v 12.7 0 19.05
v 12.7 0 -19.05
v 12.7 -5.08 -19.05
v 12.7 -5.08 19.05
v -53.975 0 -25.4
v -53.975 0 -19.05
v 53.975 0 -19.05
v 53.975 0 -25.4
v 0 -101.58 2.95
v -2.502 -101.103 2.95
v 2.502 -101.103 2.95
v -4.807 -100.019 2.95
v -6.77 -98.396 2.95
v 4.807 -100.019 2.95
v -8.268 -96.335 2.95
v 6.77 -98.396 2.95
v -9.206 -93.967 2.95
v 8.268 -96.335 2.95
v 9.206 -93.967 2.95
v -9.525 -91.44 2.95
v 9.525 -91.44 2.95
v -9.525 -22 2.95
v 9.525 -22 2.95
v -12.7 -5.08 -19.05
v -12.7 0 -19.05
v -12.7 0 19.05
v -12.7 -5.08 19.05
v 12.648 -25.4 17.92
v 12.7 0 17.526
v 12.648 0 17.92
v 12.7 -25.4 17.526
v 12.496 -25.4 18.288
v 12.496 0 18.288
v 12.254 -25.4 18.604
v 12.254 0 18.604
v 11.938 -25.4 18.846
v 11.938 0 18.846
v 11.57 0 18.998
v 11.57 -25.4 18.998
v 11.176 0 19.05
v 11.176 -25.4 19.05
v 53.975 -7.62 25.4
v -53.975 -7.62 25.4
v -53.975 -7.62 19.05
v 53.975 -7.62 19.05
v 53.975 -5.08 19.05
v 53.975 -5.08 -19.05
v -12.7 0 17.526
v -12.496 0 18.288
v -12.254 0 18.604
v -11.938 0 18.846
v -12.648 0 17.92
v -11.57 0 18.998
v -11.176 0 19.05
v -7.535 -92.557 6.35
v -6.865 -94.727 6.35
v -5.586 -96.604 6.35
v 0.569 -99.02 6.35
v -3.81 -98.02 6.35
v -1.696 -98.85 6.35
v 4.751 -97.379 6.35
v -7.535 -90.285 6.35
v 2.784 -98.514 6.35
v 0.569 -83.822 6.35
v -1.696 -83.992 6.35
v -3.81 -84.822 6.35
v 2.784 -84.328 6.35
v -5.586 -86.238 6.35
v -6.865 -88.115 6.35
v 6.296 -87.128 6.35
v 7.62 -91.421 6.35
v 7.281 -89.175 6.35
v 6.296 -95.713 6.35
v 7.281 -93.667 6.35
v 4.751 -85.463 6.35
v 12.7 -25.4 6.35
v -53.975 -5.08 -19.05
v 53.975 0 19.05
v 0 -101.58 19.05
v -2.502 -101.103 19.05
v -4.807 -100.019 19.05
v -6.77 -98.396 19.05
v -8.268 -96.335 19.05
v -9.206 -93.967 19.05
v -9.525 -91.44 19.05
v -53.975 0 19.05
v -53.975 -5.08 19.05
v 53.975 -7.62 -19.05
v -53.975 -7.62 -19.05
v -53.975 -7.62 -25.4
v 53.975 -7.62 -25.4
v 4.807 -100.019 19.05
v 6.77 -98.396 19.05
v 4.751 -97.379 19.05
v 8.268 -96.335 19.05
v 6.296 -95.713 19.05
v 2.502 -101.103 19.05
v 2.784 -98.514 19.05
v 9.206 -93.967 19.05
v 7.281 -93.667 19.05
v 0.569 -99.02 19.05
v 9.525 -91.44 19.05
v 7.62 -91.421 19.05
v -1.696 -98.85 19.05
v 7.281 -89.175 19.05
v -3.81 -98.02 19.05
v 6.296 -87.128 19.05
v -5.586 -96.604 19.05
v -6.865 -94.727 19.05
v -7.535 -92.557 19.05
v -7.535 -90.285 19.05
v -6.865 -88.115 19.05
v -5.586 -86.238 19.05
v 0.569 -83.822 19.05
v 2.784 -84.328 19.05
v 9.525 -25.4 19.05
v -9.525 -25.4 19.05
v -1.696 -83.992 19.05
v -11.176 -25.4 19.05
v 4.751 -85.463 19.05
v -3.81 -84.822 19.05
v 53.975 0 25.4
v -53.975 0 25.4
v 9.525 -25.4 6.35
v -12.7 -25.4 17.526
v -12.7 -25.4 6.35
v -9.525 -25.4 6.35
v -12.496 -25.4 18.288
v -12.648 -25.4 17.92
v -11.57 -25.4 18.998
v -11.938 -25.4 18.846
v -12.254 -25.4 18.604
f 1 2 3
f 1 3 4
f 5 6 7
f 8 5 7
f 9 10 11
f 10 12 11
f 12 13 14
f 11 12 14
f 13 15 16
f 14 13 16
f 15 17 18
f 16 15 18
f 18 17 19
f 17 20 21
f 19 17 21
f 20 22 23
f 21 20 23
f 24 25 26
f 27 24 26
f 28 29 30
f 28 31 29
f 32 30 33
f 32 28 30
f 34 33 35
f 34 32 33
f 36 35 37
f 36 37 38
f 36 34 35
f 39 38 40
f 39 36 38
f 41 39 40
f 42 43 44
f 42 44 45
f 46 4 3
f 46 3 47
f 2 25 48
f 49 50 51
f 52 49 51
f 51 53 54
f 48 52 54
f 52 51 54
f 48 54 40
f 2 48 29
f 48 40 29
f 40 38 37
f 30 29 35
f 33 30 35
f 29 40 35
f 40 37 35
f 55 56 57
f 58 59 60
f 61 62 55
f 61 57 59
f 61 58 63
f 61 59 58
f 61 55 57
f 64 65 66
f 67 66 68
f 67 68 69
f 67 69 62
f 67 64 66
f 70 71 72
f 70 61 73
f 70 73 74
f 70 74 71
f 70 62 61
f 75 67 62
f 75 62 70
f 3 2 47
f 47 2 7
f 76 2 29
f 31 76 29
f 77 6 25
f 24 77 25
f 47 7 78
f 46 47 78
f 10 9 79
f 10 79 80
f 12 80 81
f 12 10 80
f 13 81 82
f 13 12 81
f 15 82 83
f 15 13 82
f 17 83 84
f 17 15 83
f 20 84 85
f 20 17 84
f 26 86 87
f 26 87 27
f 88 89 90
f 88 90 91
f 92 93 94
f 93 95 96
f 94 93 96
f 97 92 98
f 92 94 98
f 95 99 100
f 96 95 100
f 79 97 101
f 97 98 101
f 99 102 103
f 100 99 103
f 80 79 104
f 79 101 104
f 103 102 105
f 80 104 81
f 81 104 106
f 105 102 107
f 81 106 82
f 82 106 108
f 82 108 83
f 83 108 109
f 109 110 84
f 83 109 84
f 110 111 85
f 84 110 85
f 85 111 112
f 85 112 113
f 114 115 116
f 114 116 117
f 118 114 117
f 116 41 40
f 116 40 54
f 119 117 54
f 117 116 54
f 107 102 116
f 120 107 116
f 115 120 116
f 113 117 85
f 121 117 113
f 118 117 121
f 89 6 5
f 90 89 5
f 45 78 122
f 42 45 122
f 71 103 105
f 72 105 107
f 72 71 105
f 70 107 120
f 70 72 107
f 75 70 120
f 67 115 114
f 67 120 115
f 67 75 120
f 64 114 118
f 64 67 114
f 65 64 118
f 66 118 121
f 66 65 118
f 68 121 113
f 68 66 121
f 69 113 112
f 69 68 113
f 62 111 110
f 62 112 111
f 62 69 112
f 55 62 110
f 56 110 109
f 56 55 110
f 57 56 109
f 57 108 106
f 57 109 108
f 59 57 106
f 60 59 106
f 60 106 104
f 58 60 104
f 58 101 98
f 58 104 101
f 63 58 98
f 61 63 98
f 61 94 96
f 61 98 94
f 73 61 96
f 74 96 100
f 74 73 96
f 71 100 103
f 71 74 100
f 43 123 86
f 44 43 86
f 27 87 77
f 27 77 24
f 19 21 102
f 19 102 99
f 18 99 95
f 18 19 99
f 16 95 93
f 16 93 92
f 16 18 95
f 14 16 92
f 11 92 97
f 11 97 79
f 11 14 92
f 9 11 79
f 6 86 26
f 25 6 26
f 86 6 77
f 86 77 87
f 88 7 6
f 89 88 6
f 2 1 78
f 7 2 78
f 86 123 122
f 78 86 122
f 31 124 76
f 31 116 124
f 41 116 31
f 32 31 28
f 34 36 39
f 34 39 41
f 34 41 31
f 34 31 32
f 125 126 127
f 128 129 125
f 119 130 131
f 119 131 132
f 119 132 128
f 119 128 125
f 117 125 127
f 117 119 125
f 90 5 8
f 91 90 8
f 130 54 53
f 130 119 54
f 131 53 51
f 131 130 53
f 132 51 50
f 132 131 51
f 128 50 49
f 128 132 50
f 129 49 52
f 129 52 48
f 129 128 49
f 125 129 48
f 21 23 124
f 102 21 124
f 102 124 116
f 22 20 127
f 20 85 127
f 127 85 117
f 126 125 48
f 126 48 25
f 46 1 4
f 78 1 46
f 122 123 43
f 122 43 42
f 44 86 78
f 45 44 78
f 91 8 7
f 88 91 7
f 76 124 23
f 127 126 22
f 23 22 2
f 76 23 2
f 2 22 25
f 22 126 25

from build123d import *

# Parameters (mm, degrees)
F0_W         = 15.24
F0_H         = 12.7
F0_H_2       = 0.8601994222
F1_DEPTH     = 101.6
F2_DEPTH     = 25.4
F4_START     = 6.35
F3_R         = 7.62
F4_DEPTH     = 18.796
F5_T1_DEPTH  = 66.9001994222
F0_W_2       = 41.275
F0_H_3       = 38.1
F6_DEPTH     = 5.08
F0_W_3       = 107.95
F0_H_4       = 1.016
F0_H_5       = 4.318
F7_DEPTH     = 7.62
F8_R         = 1.524
F9_T4_DEPTH  = 156.0414957887
F9_T10_DEPTH = 156.0414957887
F9_T16_DEPTH = 156.0414957887
F9_T23_DEPTH = 156.0414957887
F9_T29_DEPTH = 156.0414957887


# Not quite as in the source:
# - a fillet or chamfer that OpenCascade refuses, or shapes differently, is made with other operations: its cross-section is extruded or revolved along the edge and cut away or added


with BuildPart() as f1:
    # F0 (on Front) → F1 (new body)
    with BuildSketch(Plane.XZ):
        Polygon((9.525, 2.9498005778), (9.525, 19.05), (7.62, 19.05), (7.62, 18.1898005778), (7.62, 5.4898005778), (-7.62, 5.4898005778), (-7.62, 18.1898005778), (-7.62, 19.05), (-9.525, 19.05), (-9.525, 2.9498005778), align=None)
        with Locations((0, 11.8398005778)):
            Rectangle(F0_W, F0_H)
        with Locations((0, 18.6199002889)):
            Rectangle(F0_W, F0_H_2)
    extrude(amount=F1_DEPTH)

    # F0 (on Front) → F2 (join)
    with BuildSketch(Plane.XZ):
        Polygon((12.7, -19.05), (12.7, 19.05), (9.525, 19.05), (9.525, 2.9498005778), (-9.525, 2.9498005778), (-9.525, 19.05), (-12.7, 19.05), (-12.7, -19.05), align=None)
    extrude(amount=F2_DEPTH)

    # F3 (on Top) → F4 (cut)
    with BuildSketch(Plane.XY.offset(F4_START)):
        with Locations((0, -91.4209560153)):
            Circle(F3_R)
    extrude(amount=F4_DEPTH, mode=Mode.SUBTRACT)

    # F5: fillet of radius 10.16 on 2 edges, made by hand

    # F5_s2 → F5_t1 (cut)
    with BuildSketch(Plane.XY.offset(-22.4501994222)):
        with BuildLine():
            ThreePointArc((9.525, -91.44), (6.5492048969, -98.6242048969), (-0.635, -101.6))
            Line((-0.635, -101.6), (9.525, -101.6))
            Line((9.525, -101.6), (9.525, -91.44))
        make_face()
        with BuildLine():
            ThreePointArc((0.635, -101.6), (-6.5492048969, -98.6242048969), (-9.525, -91.44))
            Line((-9.525, -91.44), (-9.525, -101.6))
            Line((-9.525, -101.6), (0.635, -101.6))
        make_face()
    extrude(amount=F5_T1_DEPTH, mode=Mode.SUBTRACT)

    # F8
    f8_edges = [f1.edges().sort_by_distance(p)[0] for p in [
        (-12.7, -12.7, 19.05),
        (12.7, -12.7, 19.05),
    ]]
    fillet(f8_edges, radius=F8_R)

    # F9: chamfer of 25.4 on 1 edges, made by hand


with BuildPart() as f6:
    # F0 (on Front) → F6 (new body)
    with BuildSketch(Plane.XZ):
        with Locations((-33.3375, 0)):
            Rectangle(F0_W_2, F0_H_3)
    extrude(amount=F6_DEPTH)


with BuildPart() as f6b:
    # F0 (on Front) → F6, piece 2 (new body)
    with BuildSketch(Plane.XZ):
        with Locations((33.3375, 0)):
            Rectangle(F0_W_2, F0_H_3)
    extrude(amount=F6_DEPTH)


with BuildPart() as f7:
    # F0 (on Front) → F7 (new body)
    with BuildSketch(Plane.XZ):
        Polygon((53.975, -20.066), (53.975, -19.05), (12.7, -19.05), (-12.7, -19.05), (-53.975, -19.05), (-53.975, -20.066), align=None)
        with Locations((0, -24.892)):
            Rectangle(F0_W_3, F0_H_4)
        with Locations((0, -22.225)):
            Rectangle(F0_W_3, F0_H_5)
    extrude(amount=F7_DEPTH)


with BuildPart() as f7b:
    # F0 (on Front) → F7, piece 2 (new body)
    with BuildSketch(Plane.XZ):
        with Locations((0, 22.225)):
            Rectangle(F0_W_3, F0_H_5)
        with Locations((0, 24.892)):
            Rectangle(F0_W_3, F0_H_4)
        Polygon((53.975, 19.05), (53.975, 20.066), (-53.975, 20.066), (-53.975, 19.05), (-12.7, 19.05), (-9.525, 19.05), (-7.62, 19.05), (7.62, 19.05), (9.525, 19.05), (12.7, 19.05), align=None)
    extrude(amount=F7_DEPTH)


with BuildPart() as f9_tool2:
    # F9_s3 → F9_t4 (new body)
    with BuildSketch(Plane.YZ.offset(-78.0207478943)):
        Polygon((-25.4, 6.35), (0, -19.05), (-25.4, -19.05), align=None)
    extrude(amount=F9_T4_DEPTH)

    split(bisect_by=Plane.XY.offset(2.9498005778), keep=Keep.TOP)

    split(bisect_by=Plane.YZ.offset(-9.525), keep=Keep.BOTTOM)


with BuildPart() as f1_1:
    add(f1.part)

    # F9_t1: cut F9_tool2
    add(f9_tool2.part, mode=Mode.SUBTRACT)


with BuildPart() as f9_tool8:
    # F9_s9 → F9_t10 (new body)
    with BuildSketch(Plane.YZ.offset(-78.0207478943)):
        Polygon((-25.4, 6.35), (0, -19.05), (-25.4, -19.05), align=None)
    extrude(amount=F9_T10_DEPTH)

    split(bisect_by=Plane.XY.offset(2.9498005778), keep=Keep.BOTTOM)

    split(bisect_by=Plane.YZ.offset(-9.525), keep=Keep.BOTTOM)


with BuildPart() as f1_2:
    add(f1_1.part)

    # F9_t7: cut F9_tool8
    add(f9_tool8.part, mode=Mode.SUBTRACT)


with BuildPart() as f9_tool14:
    # F9_s15 → F9_t16 (new body)
    with BuildSketch(Plane.YZ.offset(-78.0207478943)):
        Polygon((-25.4, 6.35), (0, -19.05), (-25.4, -19.05), align=None)
    extrude(amount=F9_T16_DEPTH)

    split(bisect_by=Plane.YZ.offset(9.525), keep=Keep.BOTTOM)

    split(bisect_by=Plane.XY.offset(2.9498005778), keep=Keep.BOTTOM)

    split(bisect_by=Plane.YZ.offset(-9.525), keep=Keep.TOP)


with BuildPart() as f1_3:
    add(f1_2.part)

    # F9_t13: cut F9_tool14
    add(f9_tool14.part, mode=Mode.SUBTRACT)


with BuildPart() as f9_tool21:
    # F9_s22 → F9_t23 (new body)
    with BuildSketch(Plane.YZ.offset(-78.0207478943)):
        Polygon((-25.4, 6.35), (0, -19.05), (-25.4, -19.05), align=None)
    extrude(amount=F9_T23_DEPTH)

    split(bisect_by=Plane.YZ.offset(9.525), keep=Keep.TOP)

    split(bisect_by=Plane.XY.offset(2.9498005778), keep=Keep.TOP)


with BuildPart() as f1_4:
    add(f1_3.part)

    # F9_t20: cut F9_tool21
    add(f9_tool21.part, mode=Mode.SUBTRACT)


with BuildPart() as f9_tool27:
    # F9_s28 → F9_t29 (new body)
    with BuildSketch(Plane.YZ.offset(-78.0207478943)):
        Polygon((-25.4, 6.35), (0, -19.05), (-25.4, -19.05), align=None)
    extrude(amount=F9_T29_DEPTH)

    split(bisect_by=Plane.YZ.offset(9.525), keep=Keep.TOP)

    split(bisect_by=Plane.XY.offset(2.9498005778), keep=Keep.BOTTOM)


with BuildPart() as f1_5:
    add(f1_4.part)

    # F9_t26: cut F9_tool27
    add(f9_tool27.part, mode=Mode.SUBTRACT)


solid = Compound([f6.part, f6b.part, f7.part, f7b.part, f1_5.part])
